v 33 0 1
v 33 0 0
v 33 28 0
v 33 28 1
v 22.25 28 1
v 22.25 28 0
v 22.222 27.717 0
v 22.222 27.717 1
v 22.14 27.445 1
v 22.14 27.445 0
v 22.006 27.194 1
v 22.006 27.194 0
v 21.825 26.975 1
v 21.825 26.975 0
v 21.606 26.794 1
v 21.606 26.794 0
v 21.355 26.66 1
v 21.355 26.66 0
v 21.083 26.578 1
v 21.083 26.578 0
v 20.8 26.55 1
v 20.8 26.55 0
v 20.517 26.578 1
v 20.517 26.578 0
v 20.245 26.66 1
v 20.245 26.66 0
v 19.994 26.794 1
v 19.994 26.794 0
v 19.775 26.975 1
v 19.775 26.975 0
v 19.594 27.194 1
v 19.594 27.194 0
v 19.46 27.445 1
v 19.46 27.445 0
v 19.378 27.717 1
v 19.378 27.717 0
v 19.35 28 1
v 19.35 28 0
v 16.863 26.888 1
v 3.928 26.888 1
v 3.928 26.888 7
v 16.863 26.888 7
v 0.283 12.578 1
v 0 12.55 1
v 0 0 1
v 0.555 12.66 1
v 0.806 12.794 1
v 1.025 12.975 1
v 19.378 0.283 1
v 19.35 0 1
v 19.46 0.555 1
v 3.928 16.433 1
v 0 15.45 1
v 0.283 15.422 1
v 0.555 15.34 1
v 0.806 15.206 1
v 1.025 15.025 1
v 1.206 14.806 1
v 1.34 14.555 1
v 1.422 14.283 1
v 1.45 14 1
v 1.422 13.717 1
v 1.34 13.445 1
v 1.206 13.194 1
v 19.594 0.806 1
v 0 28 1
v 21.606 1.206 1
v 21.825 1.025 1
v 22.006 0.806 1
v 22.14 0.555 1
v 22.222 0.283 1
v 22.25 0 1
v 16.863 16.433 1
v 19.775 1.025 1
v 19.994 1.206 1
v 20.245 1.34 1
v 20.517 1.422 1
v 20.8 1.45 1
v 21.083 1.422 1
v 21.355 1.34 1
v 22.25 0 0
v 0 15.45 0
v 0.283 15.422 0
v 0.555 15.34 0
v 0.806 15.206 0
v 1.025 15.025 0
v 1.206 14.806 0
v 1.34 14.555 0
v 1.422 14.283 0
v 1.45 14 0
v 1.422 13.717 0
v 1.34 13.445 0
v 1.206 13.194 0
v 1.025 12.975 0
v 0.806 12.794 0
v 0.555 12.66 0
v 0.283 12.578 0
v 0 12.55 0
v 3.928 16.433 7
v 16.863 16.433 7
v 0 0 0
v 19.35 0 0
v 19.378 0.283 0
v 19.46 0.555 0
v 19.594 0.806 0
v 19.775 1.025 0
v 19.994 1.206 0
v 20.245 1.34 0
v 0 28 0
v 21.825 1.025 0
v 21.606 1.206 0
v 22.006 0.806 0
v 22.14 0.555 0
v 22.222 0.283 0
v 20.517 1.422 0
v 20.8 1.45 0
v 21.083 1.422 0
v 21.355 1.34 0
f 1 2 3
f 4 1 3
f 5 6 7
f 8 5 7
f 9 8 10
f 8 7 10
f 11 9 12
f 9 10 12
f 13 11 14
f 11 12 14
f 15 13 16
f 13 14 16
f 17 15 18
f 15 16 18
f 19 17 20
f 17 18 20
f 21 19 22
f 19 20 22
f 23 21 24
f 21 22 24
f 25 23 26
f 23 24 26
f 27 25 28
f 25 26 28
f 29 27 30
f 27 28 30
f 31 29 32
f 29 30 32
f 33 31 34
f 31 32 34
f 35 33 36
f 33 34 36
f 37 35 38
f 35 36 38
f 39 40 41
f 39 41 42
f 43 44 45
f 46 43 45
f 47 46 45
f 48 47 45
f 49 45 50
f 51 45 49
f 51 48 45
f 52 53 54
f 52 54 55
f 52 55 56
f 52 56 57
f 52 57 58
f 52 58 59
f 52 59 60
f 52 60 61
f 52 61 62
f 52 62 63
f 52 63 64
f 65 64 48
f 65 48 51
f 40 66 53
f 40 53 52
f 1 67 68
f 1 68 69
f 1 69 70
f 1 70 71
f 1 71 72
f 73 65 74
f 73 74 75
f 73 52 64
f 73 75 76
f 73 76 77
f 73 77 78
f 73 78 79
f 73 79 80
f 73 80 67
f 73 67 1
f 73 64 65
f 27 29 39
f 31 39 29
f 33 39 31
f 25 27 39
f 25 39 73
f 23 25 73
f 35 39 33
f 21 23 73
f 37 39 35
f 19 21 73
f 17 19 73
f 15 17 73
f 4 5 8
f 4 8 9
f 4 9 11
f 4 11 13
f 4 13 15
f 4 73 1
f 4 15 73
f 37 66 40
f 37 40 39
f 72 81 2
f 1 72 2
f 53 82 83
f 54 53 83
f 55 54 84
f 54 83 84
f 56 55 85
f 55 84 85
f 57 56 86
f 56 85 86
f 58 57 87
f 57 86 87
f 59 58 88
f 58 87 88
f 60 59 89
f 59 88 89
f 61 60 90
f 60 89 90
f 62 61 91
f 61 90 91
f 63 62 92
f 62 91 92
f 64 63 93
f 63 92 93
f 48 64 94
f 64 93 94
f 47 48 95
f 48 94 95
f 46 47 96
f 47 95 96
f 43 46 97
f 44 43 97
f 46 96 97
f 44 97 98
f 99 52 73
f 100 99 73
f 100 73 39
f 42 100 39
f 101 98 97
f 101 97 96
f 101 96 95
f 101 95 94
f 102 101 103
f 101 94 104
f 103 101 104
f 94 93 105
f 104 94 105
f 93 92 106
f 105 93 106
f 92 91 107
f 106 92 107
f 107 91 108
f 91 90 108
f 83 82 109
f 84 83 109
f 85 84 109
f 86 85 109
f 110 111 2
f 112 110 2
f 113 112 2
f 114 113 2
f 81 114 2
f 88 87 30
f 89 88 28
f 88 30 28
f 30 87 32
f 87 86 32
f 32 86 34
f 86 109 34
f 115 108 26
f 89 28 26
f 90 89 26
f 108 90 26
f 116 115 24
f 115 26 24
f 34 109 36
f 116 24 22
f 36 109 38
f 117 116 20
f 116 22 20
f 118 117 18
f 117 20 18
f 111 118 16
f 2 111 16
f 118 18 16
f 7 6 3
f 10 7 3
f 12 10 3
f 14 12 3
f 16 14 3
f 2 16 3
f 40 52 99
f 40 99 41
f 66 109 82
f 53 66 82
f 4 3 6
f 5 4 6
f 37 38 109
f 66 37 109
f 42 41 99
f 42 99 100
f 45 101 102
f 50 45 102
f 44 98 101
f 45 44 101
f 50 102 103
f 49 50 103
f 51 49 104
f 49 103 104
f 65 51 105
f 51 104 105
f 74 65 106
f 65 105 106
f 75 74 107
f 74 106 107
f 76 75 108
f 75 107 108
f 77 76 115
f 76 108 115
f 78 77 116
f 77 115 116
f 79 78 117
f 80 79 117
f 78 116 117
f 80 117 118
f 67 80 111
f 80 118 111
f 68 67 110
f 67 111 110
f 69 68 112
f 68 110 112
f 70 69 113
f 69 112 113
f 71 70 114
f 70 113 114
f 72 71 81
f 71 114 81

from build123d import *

# Parameters (mm, degrees)
EXTRUDE_1_DEPTH = 1
SKETCH_2_W      = 12.935520023
SKETCH_2_H      = 10.454735361
EXTRUDE_2_DEPTH = 6


with BuildPart() as part:
    # Эскиз1 → Бобышка-Вытянуть1 (new body)
    with BuildSketch(Plane.XY):
        with BuildLine():
            Line((0, 0), (19.35, 0))
            ThreePointArc((19.35, 0), (20.8, 1.45), (22.25, 0))
            Line((22.25, 0), (33, 0))
            Line((33, 0), (33, 28))
            Line((33, 28), (22.25, 28))
            ThreePointArc((22.25, 28), (20.8, 26.55), (19.35, 28))
            Line((19.35, 28), (0, 28))
            Line((0, 28), (0, 15.45))
            ThreePointArc((0, 15.45), (1.45, 14), (0, 12.55))
            Line((0, 12.55), (0, 0))
        make_face()
    extrude(amount=EXTRUDE_1_DEPTH)

    # Эскиз2 → Бобышка-Вытянуть2 (add)
    with BuildSketch(Plane.XY.offset(1)):
        with Locations((10.395518043, 21.660261576)):
            Rectangle(SKETCH_2_W, SKETCH_2_H)
    extrude(amount=EXTRUDE_2_DEPTH)


solid = part.part
